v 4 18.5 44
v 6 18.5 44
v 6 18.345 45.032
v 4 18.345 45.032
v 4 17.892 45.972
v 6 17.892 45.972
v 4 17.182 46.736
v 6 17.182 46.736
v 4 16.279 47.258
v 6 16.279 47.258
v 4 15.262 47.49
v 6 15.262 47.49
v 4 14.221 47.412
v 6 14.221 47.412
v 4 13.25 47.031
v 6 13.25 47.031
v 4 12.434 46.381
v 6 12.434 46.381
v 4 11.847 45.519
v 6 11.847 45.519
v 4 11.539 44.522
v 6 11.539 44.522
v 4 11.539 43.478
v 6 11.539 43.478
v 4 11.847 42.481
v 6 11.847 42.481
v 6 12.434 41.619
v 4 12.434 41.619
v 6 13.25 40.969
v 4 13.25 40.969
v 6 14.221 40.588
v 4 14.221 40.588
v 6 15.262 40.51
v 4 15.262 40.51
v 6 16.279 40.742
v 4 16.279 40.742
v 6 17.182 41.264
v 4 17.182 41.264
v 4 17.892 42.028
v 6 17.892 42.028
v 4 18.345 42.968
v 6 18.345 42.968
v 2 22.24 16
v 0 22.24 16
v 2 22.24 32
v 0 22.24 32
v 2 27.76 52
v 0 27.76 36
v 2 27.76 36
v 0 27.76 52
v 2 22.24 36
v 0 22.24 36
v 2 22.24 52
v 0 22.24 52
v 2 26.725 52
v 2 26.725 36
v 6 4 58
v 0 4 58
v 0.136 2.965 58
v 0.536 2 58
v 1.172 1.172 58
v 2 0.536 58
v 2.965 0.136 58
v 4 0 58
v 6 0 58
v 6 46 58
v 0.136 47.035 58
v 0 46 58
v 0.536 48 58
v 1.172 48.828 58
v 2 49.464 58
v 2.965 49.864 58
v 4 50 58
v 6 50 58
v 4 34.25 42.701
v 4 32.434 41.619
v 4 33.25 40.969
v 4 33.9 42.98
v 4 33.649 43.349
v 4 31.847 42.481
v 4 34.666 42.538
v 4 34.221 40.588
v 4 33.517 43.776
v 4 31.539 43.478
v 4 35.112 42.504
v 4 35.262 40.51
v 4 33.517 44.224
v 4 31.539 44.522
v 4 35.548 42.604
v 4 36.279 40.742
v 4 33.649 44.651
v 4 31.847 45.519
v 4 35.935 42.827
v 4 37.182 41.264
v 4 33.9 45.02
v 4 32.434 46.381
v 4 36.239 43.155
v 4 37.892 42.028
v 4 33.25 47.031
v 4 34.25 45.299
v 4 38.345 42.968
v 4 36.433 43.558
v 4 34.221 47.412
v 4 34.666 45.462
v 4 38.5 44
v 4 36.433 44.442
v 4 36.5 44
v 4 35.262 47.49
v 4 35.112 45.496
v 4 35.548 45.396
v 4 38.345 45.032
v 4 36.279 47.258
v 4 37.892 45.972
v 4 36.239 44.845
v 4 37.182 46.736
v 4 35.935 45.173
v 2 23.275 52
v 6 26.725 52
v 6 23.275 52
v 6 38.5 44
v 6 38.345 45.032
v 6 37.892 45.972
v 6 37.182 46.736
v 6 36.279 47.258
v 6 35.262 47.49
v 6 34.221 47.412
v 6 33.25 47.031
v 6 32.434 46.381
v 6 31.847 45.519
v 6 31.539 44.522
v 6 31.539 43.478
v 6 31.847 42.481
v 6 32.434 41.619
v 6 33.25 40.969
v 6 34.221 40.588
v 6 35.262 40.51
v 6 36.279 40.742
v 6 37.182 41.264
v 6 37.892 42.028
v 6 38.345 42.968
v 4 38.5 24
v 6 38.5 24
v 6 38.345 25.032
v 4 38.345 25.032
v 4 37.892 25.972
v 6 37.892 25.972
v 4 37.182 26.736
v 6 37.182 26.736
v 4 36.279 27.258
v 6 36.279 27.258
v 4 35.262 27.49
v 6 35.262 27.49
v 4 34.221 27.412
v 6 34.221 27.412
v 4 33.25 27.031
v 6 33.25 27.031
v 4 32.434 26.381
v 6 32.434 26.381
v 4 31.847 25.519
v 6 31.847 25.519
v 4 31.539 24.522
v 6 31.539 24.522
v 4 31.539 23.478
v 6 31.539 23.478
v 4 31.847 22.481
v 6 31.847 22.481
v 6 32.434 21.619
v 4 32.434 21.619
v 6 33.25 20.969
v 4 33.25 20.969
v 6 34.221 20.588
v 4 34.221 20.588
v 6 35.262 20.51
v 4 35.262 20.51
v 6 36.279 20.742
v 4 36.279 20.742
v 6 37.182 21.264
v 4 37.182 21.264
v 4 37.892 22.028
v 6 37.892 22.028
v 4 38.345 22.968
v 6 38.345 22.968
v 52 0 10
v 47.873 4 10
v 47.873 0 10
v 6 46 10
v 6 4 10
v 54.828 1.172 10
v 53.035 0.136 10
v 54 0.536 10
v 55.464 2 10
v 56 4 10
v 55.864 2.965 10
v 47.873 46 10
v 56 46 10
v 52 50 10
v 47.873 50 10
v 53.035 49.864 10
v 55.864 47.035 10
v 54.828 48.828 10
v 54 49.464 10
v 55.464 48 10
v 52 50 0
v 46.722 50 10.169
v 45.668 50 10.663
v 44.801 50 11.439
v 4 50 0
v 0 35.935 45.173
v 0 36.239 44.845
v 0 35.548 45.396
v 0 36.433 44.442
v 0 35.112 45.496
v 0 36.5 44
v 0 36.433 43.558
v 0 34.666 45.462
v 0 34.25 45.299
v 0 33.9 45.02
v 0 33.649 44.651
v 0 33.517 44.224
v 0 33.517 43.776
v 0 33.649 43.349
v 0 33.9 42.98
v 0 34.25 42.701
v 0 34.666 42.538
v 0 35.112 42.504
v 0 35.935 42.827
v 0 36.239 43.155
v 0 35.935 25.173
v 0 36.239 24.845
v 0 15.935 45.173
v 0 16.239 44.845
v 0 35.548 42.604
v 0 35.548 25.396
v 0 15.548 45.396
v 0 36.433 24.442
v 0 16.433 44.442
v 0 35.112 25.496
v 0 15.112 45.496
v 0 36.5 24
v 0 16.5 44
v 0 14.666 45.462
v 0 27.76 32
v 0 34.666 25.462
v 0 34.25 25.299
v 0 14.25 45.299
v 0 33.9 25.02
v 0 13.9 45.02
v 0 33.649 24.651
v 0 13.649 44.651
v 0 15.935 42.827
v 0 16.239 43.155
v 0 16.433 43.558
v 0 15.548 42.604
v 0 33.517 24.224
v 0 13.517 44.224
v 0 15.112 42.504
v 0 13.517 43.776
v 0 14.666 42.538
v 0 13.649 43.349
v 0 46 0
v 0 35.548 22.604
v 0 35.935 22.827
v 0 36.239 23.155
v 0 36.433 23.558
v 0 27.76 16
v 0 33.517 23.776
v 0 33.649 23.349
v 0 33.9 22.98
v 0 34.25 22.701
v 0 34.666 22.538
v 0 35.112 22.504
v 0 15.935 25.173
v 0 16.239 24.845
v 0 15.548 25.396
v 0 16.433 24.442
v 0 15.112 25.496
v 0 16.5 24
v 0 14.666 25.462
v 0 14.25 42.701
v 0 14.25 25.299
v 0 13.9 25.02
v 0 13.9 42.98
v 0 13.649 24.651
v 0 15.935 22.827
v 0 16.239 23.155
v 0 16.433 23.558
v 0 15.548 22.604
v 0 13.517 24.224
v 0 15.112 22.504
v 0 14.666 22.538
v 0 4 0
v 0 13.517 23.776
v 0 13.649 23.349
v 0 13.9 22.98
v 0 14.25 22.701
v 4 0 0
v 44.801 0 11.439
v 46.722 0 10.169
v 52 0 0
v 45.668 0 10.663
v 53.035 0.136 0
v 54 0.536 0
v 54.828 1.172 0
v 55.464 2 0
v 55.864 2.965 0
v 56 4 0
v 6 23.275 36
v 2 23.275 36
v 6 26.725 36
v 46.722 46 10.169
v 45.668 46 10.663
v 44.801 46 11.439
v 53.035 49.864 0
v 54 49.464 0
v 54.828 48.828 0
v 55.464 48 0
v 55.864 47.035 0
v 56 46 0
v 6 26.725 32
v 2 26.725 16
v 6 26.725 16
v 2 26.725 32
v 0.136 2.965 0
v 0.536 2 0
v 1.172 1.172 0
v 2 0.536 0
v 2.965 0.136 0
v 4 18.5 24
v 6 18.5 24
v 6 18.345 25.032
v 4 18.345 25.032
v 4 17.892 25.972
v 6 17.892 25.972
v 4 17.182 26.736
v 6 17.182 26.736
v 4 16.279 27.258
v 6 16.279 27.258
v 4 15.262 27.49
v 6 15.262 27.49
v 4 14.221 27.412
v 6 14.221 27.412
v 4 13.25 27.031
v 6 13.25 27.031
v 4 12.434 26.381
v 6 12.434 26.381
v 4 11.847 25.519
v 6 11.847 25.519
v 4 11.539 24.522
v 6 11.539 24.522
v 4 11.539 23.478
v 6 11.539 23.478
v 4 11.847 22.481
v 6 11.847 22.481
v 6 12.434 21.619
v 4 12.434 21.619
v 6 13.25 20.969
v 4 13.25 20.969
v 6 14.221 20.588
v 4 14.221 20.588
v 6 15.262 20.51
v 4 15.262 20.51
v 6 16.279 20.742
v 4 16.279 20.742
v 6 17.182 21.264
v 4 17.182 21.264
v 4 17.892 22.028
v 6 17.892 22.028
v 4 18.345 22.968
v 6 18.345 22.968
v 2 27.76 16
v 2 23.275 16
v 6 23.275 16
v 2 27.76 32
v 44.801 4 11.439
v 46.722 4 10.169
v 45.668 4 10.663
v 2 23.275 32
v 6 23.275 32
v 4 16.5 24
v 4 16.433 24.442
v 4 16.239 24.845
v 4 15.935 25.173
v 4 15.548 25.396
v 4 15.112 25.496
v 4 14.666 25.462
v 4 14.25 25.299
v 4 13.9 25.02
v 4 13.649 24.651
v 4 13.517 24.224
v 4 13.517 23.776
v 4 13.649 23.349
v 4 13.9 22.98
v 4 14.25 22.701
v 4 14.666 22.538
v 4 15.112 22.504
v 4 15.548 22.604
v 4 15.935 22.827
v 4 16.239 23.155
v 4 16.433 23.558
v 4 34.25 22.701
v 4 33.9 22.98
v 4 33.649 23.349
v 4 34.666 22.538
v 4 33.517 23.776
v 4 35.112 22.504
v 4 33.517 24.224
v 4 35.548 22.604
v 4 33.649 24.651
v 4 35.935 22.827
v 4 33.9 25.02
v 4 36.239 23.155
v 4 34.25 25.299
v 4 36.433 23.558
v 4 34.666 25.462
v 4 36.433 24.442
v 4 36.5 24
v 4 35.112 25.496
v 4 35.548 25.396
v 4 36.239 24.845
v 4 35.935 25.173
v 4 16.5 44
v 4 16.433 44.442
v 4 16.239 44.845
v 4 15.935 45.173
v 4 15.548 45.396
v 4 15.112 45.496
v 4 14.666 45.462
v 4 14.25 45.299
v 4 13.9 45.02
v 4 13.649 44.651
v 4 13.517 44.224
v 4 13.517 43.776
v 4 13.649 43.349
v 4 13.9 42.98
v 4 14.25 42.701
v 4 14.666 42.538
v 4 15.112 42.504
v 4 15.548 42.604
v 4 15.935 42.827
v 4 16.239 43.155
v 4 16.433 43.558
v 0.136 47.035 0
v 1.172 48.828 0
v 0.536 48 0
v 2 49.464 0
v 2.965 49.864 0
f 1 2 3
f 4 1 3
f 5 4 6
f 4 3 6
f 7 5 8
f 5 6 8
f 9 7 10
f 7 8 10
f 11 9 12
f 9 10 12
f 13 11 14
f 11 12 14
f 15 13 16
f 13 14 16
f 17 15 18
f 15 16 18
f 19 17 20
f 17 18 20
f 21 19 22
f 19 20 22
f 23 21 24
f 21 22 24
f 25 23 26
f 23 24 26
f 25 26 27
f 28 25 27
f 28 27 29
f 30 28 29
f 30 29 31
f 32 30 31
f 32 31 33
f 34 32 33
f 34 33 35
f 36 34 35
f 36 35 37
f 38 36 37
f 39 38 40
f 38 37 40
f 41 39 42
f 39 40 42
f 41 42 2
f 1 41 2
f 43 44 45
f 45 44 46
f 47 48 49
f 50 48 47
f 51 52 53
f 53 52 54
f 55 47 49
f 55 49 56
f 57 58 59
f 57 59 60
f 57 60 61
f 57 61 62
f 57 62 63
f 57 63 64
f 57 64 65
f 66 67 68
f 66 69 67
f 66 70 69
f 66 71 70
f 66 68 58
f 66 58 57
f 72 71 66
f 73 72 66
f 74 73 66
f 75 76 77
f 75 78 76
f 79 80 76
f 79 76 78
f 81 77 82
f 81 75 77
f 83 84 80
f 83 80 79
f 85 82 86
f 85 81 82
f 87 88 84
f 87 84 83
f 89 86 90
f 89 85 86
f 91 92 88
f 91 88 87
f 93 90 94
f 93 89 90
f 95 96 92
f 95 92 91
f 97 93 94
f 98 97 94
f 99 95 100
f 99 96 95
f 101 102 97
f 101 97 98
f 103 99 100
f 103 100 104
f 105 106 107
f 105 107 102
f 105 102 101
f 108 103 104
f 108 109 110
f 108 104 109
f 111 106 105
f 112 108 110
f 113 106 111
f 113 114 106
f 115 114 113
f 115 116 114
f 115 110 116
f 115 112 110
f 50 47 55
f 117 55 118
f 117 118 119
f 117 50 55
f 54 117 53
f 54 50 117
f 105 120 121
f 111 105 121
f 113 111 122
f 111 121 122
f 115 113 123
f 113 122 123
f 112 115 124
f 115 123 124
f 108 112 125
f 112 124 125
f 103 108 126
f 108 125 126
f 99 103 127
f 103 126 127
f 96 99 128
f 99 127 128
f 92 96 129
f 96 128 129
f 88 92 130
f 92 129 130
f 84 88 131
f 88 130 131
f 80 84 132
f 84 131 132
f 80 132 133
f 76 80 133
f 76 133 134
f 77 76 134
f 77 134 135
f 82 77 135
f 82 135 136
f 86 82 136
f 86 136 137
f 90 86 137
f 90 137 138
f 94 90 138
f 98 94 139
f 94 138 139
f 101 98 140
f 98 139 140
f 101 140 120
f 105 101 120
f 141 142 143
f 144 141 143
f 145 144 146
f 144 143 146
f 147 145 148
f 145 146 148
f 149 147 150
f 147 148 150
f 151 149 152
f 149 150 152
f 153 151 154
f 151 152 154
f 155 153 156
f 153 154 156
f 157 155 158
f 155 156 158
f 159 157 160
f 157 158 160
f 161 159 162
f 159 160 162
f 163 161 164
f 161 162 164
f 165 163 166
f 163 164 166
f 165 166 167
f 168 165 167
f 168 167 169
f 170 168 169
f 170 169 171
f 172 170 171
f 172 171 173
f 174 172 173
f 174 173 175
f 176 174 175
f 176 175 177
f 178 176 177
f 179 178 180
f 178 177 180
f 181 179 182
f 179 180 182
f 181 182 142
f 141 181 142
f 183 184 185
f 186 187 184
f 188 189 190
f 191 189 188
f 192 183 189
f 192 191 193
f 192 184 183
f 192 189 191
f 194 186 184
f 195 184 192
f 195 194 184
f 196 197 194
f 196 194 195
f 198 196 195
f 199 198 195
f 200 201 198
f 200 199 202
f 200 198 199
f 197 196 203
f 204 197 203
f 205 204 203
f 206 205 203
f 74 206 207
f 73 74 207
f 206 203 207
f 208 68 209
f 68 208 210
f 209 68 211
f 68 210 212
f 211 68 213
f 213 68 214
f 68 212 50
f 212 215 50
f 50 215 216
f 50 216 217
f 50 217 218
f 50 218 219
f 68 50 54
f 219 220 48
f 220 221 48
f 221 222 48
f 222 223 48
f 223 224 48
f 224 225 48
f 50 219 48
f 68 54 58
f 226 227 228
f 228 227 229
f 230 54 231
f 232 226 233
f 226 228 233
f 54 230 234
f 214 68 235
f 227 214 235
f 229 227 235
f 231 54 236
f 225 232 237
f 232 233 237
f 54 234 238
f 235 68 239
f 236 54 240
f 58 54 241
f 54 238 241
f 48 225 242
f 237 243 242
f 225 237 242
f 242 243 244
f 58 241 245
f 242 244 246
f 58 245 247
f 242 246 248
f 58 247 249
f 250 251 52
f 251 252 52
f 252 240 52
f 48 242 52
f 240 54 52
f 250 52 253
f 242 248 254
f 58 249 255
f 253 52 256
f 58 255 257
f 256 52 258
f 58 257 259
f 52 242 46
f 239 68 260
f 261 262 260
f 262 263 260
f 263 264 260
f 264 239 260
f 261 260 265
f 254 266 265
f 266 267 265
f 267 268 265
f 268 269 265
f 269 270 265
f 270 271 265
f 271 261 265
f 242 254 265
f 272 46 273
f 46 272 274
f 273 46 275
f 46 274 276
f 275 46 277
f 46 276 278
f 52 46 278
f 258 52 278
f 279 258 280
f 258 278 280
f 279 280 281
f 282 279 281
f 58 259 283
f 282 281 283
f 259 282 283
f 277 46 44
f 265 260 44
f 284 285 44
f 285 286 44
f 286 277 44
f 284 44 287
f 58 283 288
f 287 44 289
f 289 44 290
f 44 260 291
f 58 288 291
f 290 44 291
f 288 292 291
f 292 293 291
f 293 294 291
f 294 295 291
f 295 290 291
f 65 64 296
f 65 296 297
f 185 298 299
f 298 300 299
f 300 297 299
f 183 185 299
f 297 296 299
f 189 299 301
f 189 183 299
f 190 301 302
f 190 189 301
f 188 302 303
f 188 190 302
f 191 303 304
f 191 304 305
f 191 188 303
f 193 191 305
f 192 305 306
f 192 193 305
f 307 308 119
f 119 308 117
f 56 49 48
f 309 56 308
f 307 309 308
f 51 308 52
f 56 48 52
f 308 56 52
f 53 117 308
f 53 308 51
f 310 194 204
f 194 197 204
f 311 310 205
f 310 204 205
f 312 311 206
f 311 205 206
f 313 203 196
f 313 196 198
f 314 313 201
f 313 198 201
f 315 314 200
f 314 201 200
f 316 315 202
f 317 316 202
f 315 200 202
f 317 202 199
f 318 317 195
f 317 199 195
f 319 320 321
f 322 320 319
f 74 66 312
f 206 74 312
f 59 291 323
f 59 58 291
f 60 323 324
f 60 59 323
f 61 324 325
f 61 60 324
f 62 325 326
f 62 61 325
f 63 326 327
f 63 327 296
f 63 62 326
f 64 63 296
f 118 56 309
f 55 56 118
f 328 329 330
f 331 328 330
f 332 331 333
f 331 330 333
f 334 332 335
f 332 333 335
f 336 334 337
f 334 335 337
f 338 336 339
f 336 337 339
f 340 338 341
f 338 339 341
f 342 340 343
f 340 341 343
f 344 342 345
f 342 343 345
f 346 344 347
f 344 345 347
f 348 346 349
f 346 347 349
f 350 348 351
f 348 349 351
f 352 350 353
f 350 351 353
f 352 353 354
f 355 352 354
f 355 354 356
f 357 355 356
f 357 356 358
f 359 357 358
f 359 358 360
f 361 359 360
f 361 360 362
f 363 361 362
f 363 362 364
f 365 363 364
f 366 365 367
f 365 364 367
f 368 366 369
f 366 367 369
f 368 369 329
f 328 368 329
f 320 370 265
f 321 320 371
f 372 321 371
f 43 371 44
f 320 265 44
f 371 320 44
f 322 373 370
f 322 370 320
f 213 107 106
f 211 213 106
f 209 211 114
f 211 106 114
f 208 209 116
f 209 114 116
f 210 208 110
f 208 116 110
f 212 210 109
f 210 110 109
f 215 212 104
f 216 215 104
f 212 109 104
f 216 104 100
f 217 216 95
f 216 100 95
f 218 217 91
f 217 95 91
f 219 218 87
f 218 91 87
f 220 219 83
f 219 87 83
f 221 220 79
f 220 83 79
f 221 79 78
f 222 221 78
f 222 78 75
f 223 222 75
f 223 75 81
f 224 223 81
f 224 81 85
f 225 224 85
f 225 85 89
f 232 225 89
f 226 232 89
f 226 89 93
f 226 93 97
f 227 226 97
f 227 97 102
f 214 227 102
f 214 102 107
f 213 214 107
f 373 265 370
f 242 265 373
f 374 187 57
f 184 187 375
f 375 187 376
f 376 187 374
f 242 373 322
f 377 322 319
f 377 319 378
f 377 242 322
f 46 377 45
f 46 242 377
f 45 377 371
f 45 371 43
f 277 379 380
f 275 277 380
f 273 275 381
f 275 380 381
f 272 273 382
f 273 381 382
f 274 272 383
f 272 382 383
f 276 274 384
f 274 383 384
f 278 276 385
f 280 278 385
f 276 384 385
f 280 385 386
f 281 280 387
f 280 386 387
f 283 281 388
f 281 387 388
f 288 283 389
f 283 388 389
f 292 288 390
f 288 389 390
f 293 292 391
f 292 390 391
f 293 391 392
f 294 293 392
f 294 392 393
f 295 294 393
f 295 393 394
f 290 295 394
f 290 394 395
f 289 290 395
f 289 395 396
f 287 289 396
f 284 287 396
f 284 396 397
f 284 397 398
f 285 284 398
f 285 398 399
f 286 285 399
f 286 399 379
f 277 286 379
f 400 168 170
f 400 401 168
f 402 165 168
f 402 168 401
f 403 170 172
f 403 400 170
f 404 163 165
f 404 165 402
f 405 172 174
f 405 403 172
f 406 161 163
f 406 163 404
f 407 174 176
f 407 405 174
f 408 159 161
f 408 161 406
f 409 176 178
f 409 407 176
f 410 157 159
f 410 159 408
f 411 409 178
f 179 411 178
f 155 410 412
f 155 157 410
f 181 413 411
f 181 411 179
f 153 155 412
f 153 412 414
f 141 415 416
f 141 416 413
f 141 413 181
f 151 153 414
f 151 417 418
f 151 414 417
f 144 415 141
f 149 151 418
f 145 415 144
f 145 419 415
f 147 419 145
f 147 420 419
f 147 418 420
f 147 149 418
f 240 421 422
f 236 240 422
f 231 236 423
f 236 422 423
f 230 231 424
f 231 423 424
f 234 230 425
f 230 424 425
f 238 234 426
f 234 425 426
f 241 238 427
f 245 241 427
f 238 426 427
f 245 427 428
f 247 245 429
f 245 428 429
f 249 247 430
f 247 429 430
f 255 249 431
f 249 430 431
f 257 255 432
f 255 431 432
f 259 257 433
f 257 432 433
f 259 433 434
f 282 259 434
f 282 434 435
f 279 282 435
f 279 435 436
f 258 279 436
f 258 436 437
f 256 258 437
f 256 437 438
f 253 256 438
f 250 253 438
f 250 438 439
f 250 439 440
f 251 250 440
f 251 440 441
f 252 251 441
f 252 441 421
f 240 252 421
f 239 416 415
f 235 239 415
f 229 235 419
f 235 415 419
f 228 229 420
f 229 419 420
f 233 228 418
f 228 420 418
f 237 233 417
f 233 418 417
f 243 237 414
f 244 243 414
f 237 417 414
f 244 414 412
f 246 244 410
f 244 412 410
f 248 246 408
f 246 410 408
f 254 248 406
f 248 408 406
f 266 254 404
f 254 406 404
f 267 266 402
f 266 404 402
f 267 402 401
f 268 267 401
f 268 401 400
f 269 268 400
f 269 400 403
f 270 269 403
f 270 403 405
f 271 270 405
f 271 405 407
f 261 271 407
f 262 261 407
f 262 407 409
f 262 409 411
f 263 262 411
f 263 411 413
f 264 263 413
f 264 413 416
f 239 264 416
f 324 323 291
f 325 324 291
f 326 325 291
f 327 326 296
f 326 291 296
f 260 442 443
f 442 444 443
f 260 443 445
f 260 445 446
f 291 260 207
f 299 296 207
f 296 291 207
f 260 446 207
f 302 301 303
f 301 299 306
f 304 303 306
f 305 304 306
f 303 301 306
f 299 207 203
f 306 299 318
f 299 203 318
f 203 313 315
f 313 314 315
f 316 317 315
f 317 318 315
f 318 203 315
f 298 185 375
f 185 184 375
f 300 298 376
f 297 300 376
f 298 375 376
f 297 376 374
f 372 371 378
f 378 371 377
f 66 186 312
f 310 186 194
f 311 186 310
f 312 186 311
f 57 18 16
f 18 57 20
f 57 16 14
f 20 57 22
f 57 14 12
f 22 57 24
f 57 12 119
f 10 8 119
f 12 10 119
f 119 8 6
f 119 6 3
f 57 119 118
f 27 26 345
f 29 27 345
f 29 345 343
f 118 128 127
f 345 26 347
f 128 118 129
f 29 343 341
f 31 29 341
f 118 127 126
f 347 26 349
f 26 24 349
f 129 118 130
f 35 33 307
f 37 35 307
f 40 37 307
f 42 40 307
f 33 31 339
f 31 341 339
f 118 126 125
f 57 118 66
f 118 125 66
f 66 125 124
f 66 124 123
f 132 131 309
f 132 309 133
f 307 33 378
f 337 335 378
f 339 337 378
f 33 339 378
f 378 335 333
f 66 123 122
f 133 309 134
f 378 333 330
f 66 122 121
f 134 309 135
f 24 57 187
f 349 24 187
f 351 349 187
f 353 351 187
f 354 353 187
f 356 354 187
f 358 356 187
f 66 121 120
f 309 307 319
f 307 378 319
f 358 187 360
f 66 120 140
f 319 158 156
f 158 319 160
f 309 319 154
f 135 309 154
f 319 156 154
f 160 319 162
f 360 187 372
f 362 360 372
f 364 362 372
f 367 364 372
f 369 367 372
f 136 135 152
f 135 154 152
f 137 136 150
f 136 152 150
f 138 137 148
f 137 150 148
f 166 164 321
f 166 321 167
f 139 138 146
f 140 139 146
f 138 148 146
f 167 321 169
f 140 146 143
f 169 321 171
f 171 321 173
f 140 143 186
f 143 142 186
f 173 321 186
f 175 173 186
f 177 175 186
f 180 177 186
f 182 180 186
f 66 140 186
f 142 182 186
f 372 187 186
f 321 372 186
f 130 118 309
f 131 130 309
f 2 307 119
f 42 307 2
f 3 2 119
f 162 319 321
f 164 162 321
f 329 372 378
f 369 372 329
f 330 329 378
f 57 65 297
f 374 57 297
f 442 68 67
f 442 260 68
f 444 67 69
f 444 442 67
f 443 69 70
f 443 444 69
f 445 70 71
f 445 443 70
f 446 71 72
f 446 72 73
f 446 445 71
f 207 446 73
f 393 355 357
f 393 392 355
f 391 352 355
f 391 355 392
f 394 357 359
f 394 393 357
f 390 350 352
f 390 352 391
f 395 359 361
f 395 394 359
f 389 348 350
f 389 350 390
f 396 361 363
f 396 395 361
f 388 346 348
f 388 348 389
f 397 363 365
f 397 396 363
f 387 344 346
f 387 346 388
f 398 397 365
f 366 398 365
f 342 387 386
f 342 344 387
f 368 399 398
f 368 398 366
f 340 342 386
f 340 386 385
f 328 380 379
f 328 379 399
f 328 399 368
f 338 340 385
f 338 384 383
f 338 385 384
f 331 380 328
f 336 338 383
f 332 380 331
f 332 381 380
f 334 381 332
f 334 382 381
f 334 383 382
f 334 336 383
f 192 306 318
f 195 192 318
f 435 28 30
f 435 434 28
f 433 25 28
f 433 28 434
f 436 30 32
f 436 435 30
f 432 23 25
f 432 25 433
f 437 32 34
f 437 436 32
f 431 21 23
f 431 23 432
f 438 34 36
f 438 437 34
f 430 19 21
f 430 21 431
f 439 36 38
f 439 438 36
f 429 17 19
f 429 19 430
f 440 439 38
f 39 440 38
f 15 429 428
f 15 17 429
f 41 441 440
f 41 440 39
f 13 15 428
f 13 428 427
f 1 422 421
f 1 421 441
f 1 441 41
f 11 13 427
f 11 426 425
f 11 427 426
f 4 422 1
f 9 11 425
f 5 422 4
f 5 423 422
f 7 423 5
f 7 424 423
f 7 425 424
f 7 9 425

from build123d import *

# Parameters (mm, degrees)
F0_W      = 56
F0_H      = 50
F1_DEPTH  = 10
F2_W      = 40
F2_H      = 4
F3_DEPTH  = 48
F5_DEPTH  = 50.001
F6_R      = 4
F7_W      = 1.035
F7_H      = 16
F8_DEPTH  = 2
F7_W_2    = 3.45
F9_DEPTH  = 6
F10_R     = 3.5
F10_R_2   = 1.5
F11_DEPTH = 2
F12_DEPTH = 6


with BuildPart() as f1:
    # F0 (on Top) → F1 (new body)
    with BuildSketch(Plane.XY):
        with Locations((28, 25)):
            Rectangle(F0_W, F0_H)
    extrude(amount=F1_DEPTH)

    # F2 (on face) → F3 (join)
    with BuildSketch(Plane.XY.offset(10)):
        Polygon((6, 50), (0, 50), (0, 0), (6, 0), (6, 4), (6, 46), align=None)
        with Locations((26, 48)):
            Rectangle(F2_W, F2_H)
        with Locations((26, 2)):
            Rectangle(F2_W, F2_H)
    extrude(amount=F3_DEPTH)

    # F4 (on face) → F5 (cut, through all)
    with BuildSketch(Plane.XZ):
        Polygon((6, 58), (46, 10), (46, 58), align=None)
    extrude(amount=-F5_DEPTH, mode=Mode.SUBTRACT)

    # F6
    f6_edges = [f1.edges().sort_by_distance(p)[0] for p in [
        (0, 0, 29),
        (56, 0, 5),
        (46, 2, 10),
        (46, 48, 10),
        (56, 50, 5),
        (0, 50, 29),
    ]]
    fillet(f6_edges, radius=F6_R)

    # F7 (on face) → F8 (cut)
    with BuildSketch(Plane(origin=(0, 0, 0), x_dir=(0, -1, 0), z_dir=(-1, 0, 0))):
        with Locations((-27.2425, 44)):
            Rectangle(F7_W, F7_H)
        with Locations((-22.7575, 44)):
            Rectangle(F7_W, F7_H)
        with Locations((-22.7575, 24)):
            Rectangle(F7_W, F7_H)
        with Locations((-27.2425, 24)):
            Rectangle(F7_W, F7_H)
    extrude(amount=-F8_DEPTH, mode=Mode.SUBTRACT)

    # F7 (on face) → F9 (cut, through all)
    with BuildSketch(Plane(origin=(0, 0, 0), x_dir=(0, -1, 0), z_dir=(-1, 0, 0))):
        with Locations((-25, 44)):
            Rectangle(F7_W_2, F7_H)
        with Locations((-25, 24)):
            Rectangle(F7_W_2, F7_H)
    extrude(amount=-F9_DEPTH, mode=Mode.SUBTRACT)

    # F10 (on face) → F11 (cut)
    with BuildSketch(Plane.YZ.offset(6)):
        with Locations((15, 44)):
            Circle(F10_R)
        with Locations((15, 44)):
            Circle(F10_R_2, mode=Mode.SUBTRACT)
        with Locations((35, 44)):
            Circle(F10_R)
        with Locations((35, 44)):
            Circle(F10_R_2, mode=Mode.SUBTRACT)
        with Locations((35, 24)):
            Circle(F10_R)
        with Locations((35, 24)):
            Circle(F10_R_2, mode=Mode.SUBTRACT)
        with Locations((15, 24)):
            Circle(F10_R)
        with Locations((15, 24)):
            Circle(F10_R_2, mode=Mode.SUBTRACT)
    extrude(amount=-F11_DEPTH, mode=Mode.SUBTRACT)

    # F10 (on face) → F12 (cut, through all)
    with BuildSketch(Plane.YZ.offset(6)):
        with Locations((15, 44)):
            Circle(F10_R_2)
        with Locations((35, 44)):
            Circle(F10_R_2)
        with Locations((35, 24)):
            Circle(F10_R_2)
        with Locations((15, 24)):
            Circle(F10_R_2)
    extrude(amount=-F12_DEPTH, mode=Mode.SUBTRACT)


solid = f1.part
